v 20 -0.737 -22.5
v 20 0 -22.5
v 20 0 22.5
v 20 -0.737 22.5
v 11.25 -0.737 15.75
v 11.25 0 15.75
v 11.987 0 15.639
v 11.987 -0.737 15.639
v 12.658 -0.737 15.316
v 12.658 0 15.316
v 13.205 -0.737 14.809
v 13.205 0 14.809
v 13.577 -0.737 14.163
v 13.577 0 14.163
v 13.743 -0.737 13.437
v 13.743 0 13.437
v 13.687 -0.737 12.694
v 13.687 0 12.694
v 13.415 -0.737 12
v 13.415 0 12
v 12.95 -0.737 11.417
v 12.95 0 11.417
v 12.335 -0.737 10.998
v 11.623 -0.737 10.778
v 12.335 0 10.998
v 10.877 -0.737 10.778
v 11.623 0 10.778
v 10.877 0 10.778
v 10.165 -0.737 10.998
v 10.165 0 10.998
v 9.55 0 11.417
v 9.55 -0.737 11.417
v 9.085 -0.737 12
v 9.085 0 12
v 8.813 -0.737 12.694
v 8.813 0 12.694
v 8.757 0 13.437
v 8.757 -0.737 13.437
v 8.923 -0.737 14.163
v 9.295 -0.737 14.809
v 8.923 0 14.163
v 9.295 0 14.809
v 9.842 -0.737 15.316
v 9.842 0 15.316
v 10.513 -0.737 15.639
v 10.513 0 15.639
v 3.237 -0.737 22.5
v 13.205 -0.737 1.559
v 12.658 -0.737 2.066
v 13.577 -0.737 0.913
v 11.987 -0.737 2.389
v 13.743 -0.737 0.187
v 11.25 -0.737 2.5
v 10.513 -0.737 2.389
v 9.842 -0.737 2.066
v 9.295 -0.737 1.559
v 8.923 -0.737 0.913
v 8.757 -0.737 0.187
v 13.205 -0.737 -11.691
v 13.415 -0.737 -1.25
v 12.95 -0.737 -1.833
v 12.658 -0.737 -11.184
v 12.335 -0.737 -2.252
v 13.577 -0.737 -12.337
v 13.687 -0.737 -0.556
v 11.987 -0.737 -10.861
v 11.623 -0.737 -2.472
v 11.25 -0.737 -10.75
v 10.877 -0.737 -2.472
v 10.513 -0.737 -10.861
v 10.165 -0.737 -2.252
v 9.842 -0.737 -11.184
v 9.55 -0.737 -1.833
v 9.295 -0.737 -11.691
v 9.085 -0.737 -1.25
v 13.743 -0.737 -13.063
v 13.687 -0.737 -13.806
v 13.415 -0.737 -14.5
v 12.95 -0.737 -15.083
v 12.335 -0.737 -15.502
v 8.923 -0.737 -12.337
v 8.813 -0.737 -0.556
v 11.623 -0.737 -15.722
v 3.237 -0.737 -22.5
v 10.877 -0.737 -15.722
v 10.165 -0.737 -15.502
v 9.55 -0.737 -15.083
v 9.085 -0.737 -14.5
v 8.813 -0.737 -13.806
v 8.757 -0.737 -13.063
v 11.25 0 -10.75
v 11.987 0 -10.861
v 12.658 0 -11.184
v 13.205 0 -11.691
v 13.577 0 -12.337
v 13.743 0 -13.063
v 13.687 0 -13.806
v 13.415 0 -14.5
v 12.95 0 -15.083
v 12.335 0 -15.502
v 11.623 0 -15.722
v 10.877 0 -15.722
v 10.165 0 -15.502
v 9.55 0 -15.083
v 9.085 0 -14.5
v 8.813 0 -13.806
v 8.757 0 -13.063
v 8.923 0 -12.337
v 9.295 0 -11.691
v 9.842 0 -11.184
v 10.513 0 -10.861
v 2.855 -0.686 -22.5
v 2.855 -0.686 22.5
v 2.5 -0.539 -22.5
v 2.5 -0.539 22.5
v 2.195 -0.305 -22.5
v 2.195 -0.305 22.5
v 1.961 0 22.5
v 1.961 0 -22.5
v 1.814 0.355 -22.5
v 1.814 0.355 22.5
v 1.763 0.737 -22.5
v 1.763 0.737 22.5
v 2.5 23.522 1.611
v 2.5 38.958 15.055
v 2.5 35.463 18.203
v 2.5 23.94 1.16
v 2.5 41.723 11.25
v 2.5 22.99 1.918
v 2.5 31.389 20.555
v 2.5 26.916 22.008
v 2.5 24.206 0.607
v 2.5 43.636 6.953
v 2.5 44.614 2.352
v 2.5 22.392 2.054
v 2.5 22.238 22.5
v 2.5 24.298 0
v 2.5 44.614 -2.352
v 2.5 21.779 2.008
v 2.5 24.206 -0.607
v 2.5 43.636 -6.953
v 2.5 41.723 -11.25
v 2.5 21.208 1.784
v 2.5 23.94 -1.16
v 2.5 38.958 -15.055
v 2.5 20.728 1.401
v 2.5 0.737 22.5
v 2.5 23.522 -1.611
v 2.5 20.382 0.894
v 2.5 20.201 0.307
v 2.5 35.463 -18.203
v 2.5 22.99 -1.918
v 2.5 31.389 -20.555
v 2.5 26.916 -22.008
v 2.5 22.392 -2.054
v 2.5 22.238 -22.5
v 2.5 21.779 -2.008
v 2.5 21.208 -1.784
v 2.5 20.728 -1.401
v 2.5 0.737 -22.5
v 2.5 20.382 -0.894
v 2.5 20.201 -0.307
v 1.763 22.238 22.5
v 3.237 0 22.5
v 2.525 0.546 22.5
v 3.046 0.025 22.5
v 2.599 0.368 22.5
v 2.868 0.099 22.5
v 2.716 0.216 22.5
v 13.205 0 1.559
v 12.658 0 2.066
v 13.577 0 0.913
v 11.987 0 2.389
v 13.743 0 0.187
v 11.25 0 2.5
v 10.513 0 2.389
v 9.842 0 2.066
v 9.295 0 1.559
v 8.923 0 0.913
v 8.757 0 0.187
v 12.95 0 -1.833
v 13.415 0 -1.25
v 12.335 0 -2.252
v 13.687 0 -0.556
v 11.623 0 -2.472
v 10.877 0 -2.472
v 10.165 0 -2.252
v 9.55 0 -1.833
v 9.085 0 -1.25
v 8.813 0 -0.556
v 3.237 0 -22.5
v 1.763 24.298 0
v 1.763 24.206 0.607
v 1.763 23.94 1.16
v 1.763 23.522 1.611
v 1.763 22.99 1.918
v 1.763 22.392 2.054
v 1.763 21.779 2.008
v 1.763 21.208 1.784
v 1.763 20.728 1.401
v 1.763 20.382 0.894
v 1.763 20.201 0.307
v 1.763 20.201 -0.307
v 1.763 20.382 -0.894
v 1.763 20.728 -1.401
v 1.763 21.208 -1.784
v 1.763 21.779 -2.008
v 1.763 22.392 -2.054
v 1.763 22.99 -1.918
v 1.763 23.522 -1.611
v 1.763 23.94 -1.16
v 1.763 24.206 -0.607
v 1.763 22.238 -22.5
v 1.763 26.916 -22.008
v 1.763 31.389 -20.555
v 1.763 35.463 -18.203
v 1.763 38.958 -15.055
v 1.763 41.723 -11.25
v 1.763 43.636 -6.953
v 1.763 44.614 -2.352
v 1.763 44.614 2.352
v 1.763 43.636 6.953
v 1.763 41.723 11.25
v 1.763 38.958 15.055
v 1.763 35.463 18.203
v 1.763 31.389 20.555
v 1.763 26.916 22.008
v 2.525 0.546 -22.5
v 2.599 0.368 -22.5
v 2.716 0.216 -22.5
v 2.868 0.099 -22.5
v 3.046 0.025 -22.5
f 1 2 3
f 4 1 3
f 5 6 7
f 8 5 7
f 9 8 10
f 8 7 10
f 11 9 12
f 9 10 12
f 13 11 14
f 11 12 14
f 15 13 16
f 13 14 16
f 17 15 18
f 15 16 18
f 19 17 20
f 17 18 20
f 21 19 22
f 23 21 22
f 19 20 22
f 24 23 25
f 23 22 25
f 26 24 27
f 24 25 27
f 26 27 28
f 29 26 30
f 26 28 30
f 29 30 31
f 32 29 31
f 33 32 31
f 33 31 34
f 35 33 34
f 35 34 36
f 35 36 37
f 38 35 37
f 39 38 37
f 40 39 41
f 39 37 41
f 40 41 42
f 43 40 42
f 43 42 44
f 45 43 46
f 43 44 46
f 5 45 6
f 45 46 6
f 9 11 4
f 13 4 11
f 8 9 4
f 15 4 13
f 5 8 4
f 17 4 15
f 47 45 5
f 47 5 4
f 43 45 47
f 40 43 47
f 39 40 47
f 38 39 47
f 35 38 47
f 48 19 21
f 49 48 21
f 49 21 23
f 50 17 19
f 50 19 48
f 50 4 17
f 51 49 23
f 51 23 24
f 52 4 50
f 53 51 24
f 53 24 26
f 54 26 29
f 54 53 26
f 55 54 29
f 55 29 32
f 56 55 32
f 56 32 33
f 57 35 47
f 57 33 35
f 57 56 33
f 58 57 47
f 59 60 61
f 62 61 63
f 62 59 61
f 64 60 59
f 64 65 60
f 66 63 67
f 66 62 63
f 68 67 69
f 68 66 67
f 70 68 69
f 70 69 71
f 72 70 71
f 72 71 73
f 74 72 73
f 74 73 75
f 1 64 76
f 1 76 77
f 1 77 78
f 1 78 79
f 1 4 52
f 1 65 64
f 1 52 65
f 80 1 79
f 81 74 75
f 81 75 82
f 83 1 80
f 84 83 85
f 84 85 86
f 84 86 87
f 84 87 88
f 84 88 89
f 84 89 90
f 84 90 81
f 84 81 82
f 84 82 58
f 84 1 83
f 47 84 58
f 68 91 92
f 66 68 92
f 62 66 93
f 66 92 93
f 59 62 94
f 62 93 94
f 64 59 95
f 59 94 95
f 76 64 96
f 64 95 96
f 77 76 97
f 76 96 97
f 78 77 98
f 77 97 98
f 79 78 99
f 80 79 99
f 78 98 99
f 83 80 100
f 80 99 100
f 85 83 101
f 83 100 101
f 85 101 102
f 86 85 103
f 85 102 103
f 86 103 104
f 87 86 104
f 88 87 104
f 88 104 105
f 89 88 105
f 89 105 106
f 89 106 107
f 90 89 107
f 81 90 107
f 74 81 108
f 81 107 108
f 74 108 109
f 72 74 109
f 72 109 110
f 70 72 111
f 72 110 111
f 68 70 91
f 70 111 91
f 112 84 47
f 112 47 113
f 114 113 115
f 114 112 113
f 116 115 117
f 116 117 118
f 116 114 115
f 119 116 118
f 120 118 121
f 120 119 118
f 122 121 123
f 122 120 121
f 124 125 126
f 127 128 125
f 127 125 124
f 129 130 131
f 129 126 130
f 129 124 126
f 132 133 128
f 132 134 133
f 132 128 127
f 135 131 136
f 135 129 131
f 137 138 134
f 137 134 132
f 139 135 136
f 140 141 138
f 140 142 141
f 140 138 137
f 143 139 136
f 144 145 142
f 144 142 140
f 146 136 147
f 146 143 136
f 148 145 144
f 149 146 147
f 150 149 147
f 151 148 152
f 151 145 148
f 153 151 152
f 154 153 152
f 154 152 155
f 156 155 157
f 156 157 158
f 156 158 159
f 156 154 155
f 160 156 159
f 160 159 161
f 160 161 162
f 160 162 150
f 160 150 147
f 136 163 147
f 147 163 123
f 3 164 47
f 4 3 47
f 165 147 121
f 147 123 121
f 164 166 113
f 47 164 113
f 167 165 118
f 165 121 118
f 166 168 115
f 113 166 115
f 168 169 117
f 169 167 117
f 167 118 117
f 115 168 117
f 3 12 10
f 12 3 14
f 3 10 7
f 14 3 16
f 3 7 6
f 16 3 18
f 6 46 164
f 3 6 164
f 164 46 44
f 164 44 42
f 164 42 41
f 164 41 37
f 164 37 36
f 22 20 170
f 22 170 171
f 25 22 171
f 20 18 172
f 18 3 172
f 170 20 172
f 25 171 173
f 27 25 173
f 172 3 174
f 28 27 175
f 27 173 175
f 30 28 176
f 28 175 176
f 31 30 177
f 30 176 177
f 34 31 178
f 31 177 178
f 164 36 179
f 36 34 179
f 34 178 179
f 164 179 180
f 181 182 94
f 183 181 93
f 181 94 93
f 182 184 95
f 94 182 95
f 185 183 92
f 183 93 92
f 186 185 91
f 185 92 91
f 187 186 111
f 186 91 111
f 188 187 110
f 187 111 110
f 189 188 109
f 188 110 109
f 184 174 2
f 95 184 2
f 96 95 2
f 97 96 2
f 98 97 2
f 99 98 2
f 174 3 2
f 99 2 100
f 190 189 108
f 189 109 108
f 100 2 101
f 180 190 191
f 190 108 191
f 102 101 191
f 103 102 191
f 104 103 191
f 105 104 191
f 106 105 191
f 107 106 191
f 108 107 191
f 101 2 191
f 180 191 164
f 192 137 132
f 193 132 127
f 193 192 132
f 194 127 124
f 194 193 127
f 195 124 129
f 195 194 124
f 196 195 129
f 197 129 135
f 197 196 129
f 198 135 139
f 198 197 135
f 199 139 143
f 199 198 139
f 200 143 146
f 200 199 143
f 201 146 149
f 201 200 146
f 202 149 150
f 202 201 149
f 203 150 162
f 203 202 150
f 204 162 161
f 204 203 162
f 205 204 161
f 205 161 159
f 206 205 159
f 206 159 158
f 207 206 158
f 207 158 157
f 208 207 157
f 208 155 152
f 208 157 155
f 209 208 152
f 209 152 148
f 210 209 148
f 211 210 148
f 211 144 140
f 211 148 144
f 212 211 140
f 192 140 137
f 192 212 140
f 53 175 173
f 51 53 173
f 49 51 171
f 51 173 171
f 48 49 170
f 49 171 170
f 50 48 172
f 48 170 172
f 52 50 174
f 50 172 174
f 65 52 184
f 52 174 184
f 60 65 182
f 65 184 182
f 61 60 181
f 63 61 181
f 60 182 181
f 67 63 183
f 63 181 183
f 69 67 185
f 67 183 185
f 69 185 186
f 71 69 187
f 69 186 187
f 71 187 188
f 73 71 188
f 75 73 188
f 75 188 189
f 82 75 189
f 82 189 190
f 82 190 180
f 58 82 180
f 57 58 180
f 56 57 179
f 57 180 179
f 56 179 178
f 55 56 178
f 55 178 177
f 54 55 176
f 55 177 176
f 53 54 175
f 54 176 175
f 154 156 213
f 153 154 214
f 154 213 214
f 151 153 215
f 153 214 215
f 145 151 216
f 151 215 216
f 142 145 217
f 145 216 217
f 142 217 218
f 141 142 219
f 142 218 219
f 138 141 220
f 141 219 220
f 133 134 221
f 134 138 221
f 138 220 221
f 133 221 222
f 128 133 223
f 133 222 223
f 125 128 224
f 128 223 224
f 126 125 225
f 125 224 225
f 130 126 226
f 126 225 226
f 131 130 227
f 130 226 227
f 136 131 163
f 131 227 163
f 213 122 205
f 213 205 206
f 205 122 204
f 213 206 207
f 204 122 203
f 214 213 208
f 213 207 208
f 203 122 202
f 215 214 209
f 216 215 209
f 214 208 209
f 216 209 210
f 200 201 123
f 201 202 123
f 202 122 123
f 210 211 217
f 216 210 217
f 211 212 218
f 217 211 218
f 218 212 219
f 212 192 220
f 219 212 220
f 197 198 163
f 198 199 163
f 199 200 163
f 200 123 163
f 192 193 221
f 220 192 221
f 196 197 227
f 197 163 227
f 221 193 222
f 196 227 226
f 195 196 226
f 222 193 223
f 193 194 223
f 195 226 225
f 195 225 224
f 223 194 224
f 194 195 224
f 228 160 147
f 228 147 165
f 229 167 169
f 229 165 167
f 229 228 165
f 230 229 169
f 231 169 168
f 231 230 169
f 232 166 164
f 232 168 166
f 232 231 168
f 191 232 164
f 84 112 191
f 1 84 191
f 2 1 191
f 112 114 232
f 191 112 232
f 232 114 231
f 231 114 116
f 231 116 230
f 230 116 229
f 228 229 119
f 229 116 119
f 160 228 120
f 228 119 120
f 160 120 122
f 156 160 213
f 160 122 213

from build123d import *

# Parameters (mm, degrees)
SKETCH1_R                  = 2.5
SKETCH1_R_2                = 2.06
BASE_FLANGE3_DEPTH         = 0.7366
SKETCHED_START             = -43
SKETCHED_BEND1_OUTLINE_W   = 0.7366
SKETCHED_BEND1_OUTLINE_H   = 45
SKETCHED_BEND1_DEPTH       = 44.914756568
SKETCHED_START_2           = 2.495963432
SKETCHED_BEND1_2_OUTLINE_R = 2.06
SKETCHED_BEND1_2_DEPTH     = 0.004036568
SKETCHED_START_3           = 1.7634
SKETCHED_BEND1_3_OUTLINE_R = 2.06
SKETCHED_BEND1_3_DEPTH     = 1.4732
SKETCHED_START_4           = -23
SKETCHED_BEND1_4_DEPTH     = 46


with BuildPart() as part:
    # Base-Flange3: sheet metal written as solids
    # Sketch1 → Base-Flange3 (new body)
    with BuildSketch(Plane(origin=(0, 0, 0), x_dir=(1, 0, 0), z_dir=(0, 1, 0))):
        with BuildLine():
            Line((-20, 22.5), (20, 22.5))
            Line((20, 22.5), (20, -22.5))
            Line((20, -22.5), (-20, -22.5))
            ThreePointArc((-20, -22.5), (-42.5, 0), (-20, 22.5))
        make_face()
        with Locations(Location((11.25, -13.25, 0), (0, 0, 270))):
            Circle(SKETCH1_R, mode=Mode.SUBTRACT)
        with Locations(Location((11.25, 13.25, 0), (0, 0, 270))):
            Circle(SKETCH1_R, mode=Mode.SUBTRACT)
        with Locations(Location((11.25, 0, 0), (0, 0, 270))):
            Circle(SKETCH1_R, mode=Mode.SUBTRACT)
        with Locations(Location((-20, 0, 0), (0, 0, 270))):
            Circle(SKETCH1_R_2, mode=Mode.SUBTRACT)
    extrude(amount=-BASE_FLANGE3_DEPTH)

    # Sketched Bend1: read off the stored shape, not the designer's step
    # Sketched Bend1 outline → Sketched Bend1 (cut)
    with BuildSketch(Plane.YZ.offset(SKETCHED_START)):
        with Locations((-0.3683, 0)):
            Rectangle(SKETCHED_BEND1_OUTLINE_W, SKETCHED_BEND1_OUTLINE_H)
    extrude(amount=SKETCHED_BEND1_DEPTH, mode=Mode.SUBTRACT)

    # Sketched Bend1 2 outline → Sketched Bend1 2 (add)
    with BuildSketch(Plane.YZ.offset(SKETCHED_START_2)):
        with BuildLine():
            ThreePointArc((22.237627139, -22.5), (44.737627139, 0), (22.237627139, 22.5))
            Line((22.237627139, 22.5), (0, 22.5))
            Line((0, 22.5), (0, -22.5))
            Line((0, -22.5), (22.237627139, -22.5))
        make_face()
        with Locations((22.237627139, 0)):
            Circle(SKETCHED_BEND1_2_OUTLINE_R, mode=Mode.SUBTRACT)
    extrude(amount=SKETCHED_BEND1_2_DEPTH)

    # Sketched Bend1 3 outline → Sketched Bend1 3 (add)
    with BuildSketch(Plane.YZ.offset(SKETCHED_START_3)):
        with BuildLine():
            ThreePointArc((22.237627139, -22.5), (44.737627139, 0), (22.237627139, 22.5))
            Line((22.237627139, 22.5), (0, 22.5))
            Line((0, 22.5), (0, -22.5))
            Line((0, -22.5), (22.237627139, -22.5))
        make_face()
        with Locations((22.237627139, 0)):
            Circle(SKETCHED_BEND1_3_OUTLINE_R, mode=Mode.SUBTRACT)
    extrude(amount=SKETCHED_BEND1_3_DEPTH)

    # Sketched Bend1 4 outline → Sketched Bend1 4 (cut)
    with BuildSketch(Plane.XY.offset(SKETCHED_START_4)):
        with BuildLine():
            Line((2.5, 46), (2.5, 0.7366))
            ThreePointArc((2.5, 0.7366), (2.715745145, 0.215745145), (3.2366, 0))
            Line((3.2366, 0), (3.2366, 46))
            Line((3.2366, 46), (2.5, 46))
        make_face()
        with BuildLine():
            Line((1.7634, 0.7366), (1.763399995, 46))
            Line((1.763399995, 46), (0, 46))
            Line((0, 46), (0, 0))
            Line((0, 0), (1.914756568, 0))
            Line((1.914756568, 0), (1.914756568, -2))
            Line((1.914756568, -2), (5, -2))
            Line((5, -2), (5, -0.7366))
            Line((5, -0.7366), (3.2366, -0.7366))
            ThreePointArc((3.2366, -0.7366), (2.19489029, -0.30510971), (1.7634, 0.7366))
        make_face()
    extrude(amount=SKETCHED_BEND1_4_DEPTH, mode=Mode.SUBTRACT)


solid = part.part
